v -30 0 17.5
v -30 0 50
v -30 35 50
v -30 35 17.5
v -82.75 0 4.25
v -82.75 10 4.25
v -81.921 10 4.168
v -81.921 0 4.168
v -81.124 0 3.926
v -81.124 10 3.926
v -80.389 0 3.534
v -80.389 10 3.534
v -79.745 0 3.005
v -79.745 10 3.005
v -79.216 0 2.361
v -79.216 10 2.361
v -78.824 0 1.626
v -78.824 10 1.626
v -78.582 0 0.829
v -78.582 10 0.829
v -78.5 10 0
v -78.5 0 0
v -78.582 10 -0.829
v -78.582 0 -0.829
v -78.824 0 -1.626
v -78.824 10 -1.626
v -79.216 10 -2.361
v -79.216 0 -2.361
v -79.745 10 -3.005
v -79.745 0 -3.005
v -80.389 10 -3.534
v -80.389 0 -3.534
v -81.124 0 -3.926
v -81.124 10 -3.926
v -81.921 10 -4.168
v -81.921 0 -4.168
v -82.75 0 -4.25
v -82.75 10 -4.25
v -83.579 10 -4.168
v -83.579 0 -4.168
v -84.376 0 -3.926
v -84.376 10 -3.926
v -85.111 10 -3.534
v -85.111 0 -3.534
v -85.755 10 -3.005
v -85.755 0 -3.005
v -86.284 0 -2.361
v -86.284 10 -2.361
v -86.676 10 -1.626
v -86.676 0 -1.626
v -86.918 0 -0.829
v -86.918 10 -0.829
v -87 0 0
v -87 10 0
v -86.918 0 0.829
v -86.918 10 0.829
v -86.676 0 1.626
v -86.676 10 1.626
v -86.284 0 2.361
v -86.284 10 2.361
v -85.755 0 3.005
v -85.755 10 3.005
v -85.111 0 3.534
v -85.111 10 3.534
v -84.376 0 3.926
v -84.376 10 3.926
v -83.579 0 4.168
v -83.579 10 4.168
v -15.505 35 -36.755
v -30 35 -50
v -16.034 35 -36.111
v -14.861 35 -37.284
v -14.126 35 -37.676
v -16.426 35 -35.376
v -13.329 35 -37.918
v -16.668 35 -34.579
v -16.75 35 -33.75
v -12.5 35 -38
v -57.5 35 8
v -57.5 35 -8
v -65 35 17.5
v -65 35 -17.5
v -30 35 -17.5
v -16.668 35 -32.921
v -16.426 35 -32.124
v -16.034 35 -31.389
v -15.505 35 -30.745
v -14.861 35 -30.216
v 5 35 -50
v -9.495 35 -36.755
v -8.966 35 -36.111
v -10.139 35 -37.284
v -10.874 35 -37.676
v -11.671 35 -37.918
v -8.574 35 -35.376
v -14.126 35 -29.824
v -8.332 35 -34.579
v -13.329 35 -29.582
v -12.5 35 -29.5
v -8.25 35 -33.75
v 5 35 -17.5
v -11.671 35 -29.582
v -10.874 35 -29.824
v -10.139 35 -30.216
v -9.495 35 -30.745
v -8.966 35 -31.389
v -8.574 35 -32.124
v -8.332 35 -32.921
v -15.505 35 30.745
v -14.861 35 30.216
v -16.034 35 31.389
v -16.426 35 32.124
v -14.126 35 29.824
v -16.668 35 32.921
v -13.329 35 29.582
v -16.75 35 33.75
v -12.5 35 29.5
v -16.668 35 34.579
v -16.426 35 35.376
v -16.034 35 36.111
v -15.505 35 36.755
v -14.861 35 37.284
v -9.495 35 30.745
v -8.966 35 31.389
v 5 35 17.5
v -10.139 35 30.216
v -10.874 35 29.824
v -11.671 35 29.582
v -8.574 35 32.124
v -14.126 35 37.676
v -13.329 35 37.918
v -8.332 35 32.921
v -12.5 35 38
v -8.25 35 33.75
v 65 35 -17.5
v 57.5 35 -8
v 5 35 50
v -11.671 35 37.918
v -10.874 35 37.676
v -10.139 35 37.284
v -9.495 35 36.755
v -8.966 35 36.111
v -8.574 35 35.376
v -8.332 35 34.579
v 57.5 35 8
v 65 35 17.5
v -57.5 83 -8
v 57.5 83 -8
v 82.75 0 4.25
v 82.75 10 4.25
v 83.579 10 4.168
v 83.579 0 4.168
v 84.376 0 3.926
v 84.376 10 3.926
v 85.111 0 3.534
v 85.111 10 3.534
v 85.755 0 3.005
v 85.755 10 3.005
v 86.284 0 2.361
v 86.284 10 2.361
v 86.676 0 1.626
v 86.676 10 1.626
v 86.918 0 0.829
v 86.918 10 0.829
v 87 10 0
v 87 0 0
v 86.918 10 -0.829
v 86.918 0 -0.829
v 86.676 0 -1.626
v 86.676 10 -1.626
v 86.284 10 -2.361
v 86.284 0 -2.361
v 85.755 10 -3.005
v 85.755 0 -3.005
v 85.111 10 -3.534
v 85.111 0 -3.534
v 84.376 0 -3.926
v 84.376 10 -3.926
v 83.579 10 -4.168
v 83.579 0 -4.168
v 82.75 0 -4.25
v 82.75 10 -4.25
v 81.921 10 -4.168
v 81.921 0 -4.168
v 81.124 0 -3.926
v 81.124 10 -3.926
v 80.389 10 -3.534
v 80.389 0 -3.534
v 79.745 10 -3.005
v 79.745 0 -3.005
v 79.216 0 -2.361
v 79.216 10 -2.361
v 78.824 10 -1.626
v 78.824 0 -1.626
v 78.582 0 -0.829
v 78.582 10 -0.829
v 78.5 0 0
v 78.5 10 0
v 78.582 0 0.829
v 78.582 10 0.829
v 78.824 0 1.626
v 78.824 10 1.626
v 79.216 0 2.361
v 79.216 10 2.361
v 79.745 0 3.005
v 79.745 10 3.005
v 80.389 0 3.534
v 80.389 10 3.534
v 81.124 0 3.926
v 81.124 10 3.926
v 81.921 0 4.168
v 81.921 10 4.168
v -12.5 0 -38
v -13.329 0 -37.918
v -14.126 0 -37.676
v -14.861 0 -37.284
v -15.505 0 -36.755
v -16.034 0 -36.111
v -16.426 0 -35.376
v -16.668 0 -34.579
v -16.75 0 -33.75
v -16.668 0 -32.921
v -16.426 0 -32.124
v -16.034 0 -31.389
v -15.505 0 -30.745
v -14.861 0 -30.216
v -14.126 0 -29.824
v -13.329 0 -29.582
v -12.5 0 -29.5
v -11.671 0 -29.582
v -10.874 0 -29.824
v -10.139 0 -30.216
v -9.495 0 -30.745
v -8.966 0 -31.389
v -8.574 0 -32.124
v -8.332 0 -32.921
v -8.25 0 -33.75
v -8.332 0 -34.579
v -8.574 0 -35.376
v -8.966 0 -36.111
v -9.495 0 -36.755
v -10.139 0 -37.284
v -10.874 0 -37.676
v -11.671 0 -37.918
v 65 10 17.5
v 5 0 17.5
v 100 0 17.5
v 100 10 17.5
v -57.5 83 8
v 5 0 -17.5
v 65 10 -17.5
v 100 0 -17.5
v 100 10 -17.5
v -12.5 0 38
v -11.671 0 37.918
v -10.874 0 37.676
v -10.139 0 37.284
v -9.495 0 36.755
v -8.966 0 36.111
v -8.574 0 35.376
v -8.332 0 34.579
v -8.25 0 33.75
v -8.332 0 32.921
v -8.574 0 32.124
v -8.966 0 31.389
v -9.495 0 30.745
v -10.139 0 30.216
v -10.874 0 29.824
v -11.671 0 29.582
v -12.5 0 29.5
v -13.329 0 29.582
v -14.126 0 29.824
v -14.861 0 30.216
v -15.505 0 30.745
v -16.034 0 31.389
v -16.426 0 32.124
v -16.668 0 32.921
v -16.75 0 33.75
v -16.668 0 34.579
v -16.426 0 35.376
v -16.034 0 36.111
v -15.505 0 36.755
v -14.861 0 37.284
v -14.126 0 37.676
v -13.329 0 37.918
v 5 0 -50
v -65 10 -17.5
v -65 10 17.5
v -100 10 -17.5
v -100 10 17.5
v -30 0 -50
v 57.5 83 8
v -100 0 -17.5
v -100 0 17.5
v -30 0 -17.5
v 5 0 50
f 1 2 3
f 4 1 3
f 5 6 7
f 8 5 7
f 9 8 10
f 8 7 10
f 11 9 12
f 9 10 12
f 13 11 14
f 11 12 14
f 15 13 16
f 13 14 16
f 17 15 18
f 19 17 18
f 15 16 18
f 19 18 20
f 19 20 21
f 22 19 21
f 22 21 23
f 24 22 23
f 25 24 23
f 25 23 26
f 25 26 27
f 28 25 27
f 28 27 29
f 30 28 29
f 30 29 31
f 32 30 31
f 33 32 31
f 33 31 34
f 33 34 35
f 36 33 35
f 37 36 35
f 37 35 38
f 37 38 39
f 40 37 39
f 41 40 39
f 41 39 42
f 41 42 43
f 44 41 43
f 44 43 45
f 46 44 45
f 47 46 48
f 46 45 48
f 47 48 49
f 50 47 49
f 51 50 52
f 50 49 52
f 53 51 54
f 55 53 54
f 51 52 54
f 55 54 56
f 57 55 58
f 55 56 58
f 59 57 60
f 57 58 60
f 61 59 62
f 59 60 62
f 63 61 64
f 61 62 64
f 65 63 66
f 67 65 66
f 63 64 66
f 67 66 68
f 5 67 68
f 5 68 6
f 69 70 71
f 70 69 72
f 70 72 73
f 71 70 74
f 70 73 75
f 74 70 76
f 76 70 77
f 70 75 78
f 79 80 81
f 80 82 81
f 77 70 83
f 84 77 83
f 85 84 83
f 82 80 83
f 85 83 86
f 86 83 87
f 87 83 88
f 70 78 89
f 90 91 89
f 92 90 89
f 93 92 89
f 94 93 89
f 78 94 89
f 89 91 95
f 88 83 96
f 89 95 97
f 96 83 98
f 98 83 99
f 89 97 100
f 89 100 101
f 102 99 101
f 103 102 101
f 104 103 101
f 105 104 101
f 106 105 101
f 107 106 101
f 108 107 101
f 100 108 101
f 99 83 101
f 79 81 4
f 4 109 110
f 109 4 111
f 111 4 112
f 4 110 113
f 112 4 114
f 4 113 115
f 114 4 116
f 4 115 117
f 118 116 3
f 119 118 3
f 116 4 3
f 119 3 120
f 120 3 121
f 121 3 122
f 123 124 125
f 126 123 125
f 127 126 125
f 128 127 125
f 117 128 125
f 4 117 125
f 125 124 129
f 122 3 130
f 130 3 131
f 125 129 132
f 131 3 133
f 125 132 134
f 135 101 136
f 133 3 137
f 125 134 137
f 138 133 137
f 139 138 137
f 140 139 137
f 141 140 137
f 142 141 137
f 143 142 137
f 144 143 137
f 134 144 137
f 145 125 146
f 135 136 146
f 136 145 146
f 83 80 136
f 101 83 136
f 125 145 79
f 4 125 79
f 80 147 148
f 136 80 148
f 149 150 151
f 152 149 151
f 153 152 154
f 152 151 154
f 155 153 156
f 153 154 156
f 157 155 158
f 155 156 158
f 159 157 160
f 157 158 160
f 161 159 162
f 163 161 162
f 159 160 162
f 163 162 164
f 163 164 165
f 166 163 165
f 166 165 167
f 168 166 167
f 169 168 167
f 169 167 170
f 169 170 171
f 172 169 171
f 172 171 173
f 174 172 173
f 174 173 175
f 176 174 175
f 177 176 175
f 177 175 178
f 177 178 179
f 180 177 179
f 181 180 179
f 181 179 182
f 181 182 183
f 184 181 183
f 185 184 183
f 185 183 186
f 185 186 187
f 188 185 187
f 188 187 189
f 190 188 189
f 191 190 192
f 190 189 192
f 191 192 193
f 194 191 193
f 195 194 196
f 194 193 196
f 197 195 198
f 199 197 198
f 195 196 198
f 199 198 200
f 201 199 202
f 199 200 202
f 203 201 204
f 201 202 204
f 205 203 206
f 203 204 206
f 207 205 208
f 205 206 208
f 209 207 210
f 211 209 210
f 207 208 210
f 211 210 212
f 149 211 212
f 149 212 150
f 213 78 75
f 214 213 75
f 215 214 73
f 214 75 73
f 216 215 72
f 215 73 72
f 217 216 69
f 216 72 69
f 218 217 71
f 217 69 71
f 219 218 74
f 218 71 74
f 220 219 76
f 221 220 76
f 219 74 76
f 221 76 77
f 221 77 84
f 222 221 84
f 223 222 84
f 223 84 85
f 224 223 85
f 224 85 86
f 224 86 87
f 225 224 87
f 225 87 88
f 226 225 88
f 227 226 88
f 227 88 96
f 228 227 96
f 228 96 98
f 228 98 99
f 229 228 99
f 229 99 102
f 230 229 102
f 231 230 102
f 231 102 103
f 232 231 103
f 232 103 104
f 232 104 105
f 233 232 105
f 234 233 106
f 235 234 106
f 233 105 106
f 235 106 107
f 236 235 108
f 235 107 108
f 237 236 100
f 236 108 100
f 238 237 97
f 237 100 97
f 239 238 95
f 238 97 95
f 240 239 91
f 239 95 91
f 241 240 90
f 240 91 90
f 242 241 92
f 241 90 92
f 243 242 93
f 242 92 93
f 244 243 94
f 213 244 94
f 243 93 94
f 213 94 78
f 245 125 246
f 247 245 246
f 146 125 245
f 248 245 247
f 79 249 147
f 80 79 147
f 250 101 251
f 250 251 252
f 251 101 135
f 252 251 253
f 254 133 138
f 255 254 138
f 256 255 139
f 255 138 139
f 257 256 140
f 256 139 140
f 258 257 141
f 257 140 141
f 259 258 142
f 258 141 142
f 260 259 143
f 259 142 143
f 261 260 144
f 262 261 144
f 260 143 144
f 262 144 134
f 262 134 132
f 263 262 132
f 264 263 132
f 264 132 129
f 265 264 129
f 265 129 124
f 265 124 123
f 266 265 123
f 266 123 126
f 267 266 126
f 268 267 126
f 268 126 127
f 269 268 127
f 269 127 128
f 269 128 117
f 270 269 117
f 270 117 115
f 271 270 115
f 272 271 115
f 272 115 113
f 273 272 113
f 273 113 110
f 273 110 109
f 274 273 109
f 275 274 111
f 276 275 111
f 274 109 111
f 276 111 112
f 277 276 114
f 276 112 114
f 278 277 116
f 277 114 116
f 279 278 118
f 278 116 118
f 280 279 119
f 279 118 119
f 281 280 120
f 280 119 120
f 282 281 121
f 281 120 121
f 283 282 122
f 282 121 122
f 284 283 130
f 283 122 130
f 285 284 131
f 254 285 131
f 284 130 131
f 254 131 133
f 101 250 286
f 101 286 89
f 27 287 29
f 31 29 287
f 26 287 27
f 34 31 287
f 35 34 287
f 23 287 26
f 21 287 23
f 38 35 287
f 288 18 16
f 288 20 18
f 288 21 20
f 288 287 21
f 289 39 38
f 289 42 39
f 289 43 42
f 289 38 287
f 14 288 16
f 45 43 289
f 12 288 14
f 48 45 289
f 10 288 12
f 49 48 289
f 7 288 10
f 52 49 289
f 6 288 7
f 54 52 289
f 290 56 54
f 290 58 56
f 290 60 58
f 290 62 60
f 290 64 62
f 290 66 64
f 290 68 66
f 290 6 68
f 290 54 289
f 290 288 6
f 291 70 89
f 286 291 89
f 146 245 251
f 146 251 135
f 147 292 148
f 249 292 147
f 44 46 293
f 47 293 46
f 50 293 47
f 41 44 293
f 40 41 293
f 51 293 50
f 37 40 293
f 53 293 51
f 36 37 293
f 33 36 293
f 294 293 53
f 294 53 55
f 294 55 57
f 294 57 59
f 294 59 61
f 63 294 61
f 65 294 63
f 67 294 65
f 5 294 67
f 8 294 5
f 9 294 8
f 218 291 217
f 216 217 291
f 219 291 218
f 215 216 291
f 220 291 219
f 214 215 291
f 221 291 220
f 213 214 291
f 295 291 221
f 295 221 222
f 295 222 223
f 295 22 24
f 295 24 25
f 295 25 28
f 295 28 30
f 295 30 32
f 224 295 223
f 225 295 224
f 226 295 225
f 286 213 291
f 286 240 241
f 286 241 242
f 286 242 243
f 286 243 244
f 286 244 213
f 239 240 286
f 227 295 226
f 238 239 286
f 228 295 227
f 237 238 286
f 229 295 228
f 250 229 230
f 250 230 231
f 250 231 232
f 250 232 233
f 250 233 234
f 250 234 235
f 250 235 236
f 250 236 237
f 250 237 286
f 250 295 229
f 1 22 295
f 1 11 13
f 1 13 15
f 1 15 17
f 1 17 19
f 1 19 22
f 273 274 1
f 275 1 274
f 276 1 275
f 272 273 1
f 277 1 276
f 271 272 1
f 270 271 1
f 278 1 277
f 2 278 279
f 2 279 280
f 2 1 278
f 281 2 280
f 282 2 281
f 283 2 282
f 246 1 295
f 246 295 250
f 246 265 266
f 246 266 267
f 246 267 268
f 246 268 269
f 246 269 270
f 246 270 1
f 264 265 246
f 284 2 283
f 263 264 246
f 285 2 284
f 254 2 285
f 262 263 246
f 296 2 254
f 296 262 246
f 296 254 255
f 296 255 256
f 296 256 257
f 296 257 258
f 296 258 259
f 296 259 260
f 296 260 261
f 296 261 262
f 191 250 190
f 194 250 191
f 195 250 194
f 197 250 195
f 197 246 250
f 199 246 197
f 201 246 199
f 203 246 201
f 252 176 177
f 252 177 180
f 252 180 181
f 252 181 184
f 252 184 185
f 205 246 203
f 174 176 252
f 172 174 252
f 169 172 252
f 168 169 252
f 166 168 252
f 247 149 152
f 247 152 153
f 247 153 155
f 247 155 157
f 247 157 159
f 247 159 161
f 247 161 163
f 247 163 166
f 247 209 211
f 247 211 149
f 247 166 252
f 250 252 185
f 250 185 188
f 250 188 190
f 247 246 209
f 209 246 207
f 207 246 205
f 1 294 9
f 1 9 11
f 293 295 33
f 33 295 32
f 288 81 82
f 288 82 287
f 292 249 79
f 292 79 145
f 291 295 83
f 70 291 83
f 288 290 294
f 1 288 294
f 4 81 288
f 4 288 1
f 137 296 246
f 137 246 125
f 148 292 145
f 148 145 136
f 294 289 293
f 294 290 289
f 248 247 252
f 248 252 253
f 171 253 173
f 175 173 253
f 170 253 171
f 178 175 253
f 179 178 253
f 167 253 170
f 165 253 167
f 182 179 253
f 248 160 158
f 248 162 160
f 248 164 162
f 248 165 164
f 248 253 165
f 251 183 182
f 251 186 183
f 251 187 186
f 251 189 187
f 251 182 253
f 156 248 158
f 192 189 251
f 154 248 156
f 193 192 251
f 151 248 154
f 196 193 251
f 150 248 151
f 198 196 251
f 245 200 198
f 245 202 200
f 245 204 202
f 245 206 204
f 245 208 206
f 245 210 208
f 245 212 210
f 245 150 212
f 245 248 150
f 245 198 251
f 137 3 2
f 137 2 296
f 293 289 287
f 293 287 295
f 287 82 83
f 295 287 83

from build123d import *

# Parameters (mm, degrees)
BOSS_EXTRUDE1_DEPTH = 17.5
SKETCH4_OUTSIDE_W   = 245.87
SKETCH4_OUTSIDE_H   = 80.87
SKETCH4_OUTSIDE_W_2 = 115
SKETCH4_OUTSIDE_H_2 = 16
CUT_EXTRUDE1_DEPTH  = 48
SKETCH5_W           = 35
SKETCH5_H           = 35
BOSS_EXTRUDE2_DEPTH = 50
SKETCH6_R           = 4.25
CUT_EXTRUDE2_DEPTH  = 122.671689394


with BuildPart() as part:
    # Sketch1 → Boss-Extrude1 (new, symmetric)
    with BuildSketch(Plane.XY):
        Polygon((-100, 0), (100, 0), (100, 10), (65, 10), (65, 35), (57.5, 35), (57.5, 83), (-57.5, 83), (-57.5, 35), (-65, 35), (-65, 10), (-100, 10), align=None)
    extrude(amount=BOSS_EXTRUDE1_DEPTH, both=True)

    # Sketch4 outside → Cut-Extrude1 (cut)
    with BuildSketch(Plane(origin=(0, 83, 0), x_dir=(1, 0, 0), z_dir=(0, 1, 0))):
        Rectangle(SKETCH4_OUTSIDE_W, SKETCH4_OUTSIDE_H)
        Rectangle(SKETCH4_OUTSIDE_W_2, SKETCH4_OUTSIDE_H_2, mode=Mode.SUBTRACT)
    extrude(amount=-CUT_EXTRUDE1_DEPTH, mode=Mode.SUBTRACT)

    # Sketch5 → Boss-Extrude2 (add, symmetric)
    with BuildSketch(Plane.XY):
        with Locations((-12.5, 17.5)):
            Rectangle(SKETCH5_W, SKETCH5_H)
    extrude(amount=BOSS_EXTRUDE2_DEPTH, both=True)

    # Sketch6 → Cut-Extrude2 (cut, through all)
    with BuildSketch(Plane(origin=(0, 35, 0), x_dir=(1, 0, 0), z_dir=(0, 1, 0))):
        with Locations(Location((-12.5, -33.75, 0), (0, 0, 270))):
            Circle(SKETCH6_R)
        with Locations(Location((-82.75, 0, 0), (0, 0, 270))):
            Circle(SKETCH6_R)
        with Locations(Location((82.75, 0, 0), (0, 0, 270))):
            Circle(SKETCH6_R)
        with Locations(Location((-12.5, 33.75, 0), (0, 0, 90))):
            Circle(SKETCH6_R)
    extrude(amount=-CUT_EXTRUDE2_DEPTH, mode=Mode.SUBTRACT)


solid = part.part
